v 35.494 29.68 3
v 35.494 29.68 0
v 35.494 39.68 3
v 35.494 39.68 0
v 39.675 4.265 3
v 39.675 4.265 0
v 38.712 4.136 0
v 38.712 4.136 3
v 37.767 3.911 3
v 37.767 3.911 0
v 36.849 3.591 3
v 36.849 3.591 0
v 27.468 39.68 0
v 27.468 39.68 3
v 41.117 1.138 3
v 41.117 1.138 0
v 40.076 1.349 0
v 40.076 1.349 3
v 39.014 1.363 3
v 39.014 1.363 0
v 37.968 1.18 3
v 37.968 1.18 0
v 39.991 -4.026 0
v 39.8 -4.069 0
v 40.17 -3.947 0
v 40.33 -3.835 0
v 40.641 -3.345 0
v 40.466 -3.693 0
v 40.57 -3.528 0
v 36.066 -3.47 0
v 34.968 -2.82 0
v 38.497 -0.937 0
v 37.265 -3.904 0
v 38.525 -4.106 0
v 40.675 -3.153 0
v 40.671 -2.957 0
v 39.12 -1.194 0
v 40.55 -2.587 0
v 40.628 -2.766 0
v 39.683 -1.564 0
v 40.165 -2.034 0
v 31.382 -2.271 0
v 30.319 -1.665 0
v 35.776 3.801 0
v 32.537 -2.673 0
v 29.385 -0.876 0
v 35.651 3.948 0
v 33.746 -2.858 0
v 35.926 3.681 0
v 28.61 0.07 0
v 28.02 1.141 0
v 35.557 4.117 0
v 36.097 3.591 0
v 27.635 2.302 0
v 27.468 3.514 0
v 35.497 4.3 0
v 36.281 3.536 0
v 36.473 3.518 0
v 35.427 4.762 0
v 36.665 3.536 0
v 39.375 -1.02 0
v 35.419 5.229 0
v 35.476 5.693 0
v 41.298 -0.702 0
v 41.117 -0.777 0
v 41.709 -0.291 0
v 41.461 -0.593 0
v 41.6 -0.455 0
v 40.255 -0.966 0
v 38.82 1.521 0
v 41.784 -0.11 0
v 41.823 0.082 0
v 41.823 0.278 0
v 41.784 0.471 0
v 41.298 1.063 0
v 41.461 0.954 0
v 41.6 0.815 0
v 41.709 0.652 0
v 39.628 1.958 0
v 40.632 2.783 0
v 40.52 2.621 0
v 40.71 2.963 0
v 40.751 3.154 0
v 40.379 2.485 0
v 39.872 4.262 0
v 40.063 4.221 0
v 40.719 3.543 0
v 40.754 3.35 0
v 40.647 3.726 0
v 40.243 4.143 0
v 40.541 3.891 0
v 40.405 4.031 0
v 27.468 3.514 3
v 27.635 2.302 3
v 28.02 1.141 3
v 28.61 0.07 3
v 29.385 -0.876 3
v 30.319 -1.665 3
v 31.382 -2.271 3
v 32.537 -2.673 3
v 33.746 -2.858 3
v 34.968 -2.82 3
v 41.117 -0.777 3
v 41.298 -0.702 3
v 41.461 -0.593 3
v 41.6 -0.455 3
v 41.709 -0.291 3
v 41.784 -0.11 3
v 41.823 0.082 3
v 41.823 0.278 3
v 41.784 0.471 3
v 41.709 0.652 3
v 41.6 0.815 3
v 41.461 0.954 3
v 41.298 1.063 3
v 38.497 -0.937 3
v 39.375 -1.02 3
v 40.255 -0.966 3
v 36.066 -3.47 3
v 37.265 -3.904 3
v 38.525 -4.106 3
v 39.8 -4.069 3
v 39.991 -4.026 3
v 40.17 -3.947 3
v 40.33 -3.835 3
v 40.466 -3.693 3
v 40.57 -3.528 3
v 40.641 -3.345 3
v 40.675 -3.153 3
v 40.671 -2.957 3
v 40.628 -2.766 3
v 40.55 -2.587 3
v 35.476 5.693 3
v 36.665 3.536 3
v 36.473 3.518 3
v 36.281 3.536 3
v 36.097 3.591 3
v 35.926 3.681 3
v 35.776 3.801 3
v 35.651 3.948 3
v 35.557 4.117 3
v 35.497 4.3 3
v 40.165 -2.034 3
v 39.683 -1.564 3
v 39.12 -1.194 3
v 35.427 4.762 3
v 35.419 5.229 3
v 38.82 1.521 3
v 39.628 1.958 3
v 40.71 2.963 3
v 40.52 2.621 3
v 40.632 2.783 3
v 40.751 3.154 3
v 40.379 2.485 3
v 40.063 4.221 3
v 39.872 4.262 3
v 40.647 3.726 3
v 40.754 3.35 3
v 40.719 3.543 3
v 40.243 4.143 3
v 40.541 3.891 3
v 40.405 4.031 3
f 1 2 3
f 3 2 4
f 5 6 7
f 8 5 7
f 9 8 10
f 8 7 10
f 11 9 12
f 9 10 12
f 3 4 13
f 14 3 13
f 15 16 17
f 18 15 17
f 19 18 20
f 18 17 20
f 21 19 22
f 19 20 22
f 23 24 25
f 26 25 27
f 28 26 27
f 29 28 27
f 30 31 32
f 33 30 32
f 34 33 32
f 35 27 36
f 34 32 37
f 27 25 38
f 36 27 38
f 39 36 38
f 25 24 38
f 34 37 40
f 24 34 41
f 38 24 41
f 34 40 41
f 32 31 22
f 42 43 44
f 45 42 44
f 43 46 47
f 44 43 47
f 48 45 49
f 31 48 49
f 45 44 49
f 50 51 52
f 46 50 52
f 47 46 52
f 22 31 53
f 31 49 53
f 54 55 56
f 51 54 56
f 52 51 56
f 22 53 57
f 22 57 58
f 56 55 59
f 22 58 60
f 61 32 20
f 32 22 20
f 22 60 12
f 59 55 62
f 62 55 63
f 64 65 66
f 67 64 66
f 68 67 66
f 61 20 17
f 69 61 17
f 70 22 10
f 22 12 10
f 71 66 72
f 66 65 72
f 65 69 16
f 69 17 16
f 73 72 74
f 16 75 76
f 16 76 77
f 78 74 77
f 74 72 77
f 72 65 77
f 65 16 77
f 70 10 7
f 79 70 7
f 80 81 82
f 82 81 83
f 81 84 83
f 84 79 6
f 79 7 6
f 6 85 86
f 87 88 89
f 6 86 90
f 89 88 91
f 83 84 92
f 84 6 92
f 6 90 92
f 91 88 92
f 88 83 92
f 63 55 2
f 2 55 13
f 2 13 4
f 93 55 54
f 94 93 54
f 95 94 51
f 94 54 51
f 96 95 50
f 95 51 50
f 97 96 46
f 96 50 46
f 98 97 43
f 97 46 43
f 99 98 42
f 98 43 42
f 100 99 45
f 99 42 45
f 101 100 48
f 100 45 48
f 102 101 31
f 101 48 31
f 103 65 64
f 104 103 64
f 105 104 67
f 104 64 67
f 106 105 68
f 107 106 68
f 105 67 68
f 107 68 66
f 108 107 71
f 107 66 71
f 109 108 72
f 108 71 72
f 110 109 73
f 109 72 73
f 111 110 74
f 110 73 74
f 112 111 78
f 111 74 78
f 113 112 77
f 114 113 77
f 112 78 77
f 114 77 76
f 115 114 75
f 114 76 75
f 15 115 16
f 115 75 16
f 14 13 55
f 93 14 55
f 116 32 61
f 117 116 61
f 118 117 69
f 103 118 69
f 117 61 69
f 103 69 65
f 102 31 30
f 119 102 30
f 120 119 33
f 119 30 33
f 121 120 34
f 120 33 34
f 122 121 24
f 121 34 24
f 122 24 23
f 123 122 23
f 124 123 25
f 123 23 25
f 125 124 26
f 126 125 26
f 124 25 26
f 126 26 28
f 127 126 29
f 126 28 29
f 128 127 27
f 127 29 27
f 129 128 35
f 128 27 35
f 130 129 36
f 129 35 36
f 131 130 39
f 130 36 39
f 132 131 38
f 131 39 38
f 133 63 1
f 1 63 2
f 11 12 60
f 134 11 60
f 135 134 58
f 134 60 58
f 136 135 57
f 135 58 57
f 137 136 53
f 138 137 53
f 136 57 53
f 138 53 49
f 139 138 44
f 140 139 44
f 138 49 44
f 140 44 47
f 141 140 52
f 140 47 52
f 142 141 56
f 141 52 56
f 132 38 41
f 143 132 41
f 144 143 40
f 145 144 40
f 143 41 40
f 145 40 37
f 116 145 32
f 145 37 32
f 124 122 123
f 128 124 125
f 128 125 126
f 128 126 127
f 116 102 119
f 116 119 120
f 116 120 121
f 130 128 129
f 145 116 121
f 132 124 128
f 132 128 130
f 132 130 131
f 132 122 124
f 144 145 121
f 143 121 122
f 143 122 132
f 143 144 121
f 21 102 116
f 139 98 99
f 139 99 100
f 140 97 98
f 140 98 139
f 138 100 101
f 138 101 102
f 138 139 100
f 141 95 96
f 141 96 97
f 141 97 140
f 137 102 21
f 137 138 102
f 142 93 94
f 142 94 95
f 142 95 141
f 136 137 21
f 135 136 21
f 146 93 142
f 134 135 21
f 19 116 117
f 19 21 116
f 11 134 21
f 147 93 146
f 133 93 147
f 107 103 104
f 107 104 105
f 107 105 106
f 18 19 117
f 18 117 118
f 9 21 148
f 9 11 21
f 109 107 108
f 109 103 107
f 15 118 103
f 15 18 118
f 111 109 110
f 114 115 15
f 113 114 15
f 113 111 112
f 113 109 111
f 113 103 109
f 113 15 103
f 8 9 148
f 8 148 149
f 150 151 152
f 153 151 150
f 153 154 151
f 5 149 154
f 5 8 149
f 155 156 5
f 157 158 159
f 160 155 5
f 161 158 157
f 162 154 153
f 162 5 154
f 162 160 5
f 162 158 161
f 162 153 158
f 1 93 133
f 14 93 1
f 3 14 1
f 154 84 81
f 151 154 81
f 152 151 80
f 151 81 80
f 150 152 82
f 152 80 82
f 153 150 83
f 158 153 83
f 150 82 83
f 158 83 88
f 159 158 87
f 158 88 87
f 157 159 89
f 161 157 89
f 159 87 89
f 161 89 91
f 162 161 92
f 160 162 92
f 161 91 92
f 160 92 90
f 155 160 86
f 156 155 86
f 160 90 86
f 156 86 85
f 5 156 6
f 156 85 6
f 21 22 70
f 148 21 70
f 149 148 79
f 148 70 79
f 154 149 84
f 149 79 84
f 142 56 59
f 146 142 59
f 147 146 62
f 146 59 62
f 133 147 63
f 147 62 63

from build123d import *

# Parameters (mm, degrees)
SALIENTE_EXTRUIR1_DEPTH = 3


with BuildPart() as part:
    # Model → Saliente-Extruir1 (new body)
    with BuildSketch(Plane.XY):
        with BuildLine():
            Line((27.467941077, 39.680349578), (27.467941077, 22.097099578))
            Line((27.467941077, 22.097099578), (27.467941077, 3.513849578))
            ThreePointArc((27.467941077, 3.513849578), (29.833805345, -1.291965393), (34.967941077, -2.819650422))
            ThreePointArc((34.967941077, -2.819650422), (37.2653644, -3.903815719), (39.800359504, -4.069248896))
            ThreePointArc((39.800359504, -4.069248896), (40.5704791, -3.527774359), (40.549576341, -2.586582592))
            ThreePointArc((40.549576341, -2.586582592), (39.682712456, -1.563786177), (38.497352842, -0.937297481))
            ThreePointArc((38.497352842, -0.937297481), (39.816352512, -1.009870934), (41.116644878, -0.776918583))
            ThreePointArc((41.116644878, -0.776918583), (41.8274431, 0.180349578), (41.116644878, 1.137617739))
            ThreePointArc((41.116644878, 1.137617739), (39.545301969, 1.380701786), (37.967941077, 1.180349578))
            ThreePointArc((37.967941077, 1.180349578), (39.230469791, 1.72740936), (40.379023795, 2.485087958))
            ThreePointArc((40.379023795, 2.485087958), (40.687813038, 3.636299223), (39.675412289, 4.265332526))
            ThreePointArc((39.675412289, 4.265332526), (38.236782457, 4.035665244), (36.849346326, 3.591341219))
            ThreePointArc((36.849346326, 3.591341219), (36.009082944, 3.632037192), (35.497205789, 4.299630249))
            ThreePointArc((35.497205789, 4.299630249), (35.415004717, 4.995458697), (35.476051331, 5.693461244))
            Line((35.476051331, 5.693461244), (35.493981077, 29.680349578))
            Line((35.493981077, 29.680349578), (35.493981077, 39.680349578))
            Line((35.493981077, 39.680349578), (27.467941077, 39.680349578))
        make_face()
    extrude(amount=SALIENTE_EXTRUIR1_DEPTH)


solid = part.part
